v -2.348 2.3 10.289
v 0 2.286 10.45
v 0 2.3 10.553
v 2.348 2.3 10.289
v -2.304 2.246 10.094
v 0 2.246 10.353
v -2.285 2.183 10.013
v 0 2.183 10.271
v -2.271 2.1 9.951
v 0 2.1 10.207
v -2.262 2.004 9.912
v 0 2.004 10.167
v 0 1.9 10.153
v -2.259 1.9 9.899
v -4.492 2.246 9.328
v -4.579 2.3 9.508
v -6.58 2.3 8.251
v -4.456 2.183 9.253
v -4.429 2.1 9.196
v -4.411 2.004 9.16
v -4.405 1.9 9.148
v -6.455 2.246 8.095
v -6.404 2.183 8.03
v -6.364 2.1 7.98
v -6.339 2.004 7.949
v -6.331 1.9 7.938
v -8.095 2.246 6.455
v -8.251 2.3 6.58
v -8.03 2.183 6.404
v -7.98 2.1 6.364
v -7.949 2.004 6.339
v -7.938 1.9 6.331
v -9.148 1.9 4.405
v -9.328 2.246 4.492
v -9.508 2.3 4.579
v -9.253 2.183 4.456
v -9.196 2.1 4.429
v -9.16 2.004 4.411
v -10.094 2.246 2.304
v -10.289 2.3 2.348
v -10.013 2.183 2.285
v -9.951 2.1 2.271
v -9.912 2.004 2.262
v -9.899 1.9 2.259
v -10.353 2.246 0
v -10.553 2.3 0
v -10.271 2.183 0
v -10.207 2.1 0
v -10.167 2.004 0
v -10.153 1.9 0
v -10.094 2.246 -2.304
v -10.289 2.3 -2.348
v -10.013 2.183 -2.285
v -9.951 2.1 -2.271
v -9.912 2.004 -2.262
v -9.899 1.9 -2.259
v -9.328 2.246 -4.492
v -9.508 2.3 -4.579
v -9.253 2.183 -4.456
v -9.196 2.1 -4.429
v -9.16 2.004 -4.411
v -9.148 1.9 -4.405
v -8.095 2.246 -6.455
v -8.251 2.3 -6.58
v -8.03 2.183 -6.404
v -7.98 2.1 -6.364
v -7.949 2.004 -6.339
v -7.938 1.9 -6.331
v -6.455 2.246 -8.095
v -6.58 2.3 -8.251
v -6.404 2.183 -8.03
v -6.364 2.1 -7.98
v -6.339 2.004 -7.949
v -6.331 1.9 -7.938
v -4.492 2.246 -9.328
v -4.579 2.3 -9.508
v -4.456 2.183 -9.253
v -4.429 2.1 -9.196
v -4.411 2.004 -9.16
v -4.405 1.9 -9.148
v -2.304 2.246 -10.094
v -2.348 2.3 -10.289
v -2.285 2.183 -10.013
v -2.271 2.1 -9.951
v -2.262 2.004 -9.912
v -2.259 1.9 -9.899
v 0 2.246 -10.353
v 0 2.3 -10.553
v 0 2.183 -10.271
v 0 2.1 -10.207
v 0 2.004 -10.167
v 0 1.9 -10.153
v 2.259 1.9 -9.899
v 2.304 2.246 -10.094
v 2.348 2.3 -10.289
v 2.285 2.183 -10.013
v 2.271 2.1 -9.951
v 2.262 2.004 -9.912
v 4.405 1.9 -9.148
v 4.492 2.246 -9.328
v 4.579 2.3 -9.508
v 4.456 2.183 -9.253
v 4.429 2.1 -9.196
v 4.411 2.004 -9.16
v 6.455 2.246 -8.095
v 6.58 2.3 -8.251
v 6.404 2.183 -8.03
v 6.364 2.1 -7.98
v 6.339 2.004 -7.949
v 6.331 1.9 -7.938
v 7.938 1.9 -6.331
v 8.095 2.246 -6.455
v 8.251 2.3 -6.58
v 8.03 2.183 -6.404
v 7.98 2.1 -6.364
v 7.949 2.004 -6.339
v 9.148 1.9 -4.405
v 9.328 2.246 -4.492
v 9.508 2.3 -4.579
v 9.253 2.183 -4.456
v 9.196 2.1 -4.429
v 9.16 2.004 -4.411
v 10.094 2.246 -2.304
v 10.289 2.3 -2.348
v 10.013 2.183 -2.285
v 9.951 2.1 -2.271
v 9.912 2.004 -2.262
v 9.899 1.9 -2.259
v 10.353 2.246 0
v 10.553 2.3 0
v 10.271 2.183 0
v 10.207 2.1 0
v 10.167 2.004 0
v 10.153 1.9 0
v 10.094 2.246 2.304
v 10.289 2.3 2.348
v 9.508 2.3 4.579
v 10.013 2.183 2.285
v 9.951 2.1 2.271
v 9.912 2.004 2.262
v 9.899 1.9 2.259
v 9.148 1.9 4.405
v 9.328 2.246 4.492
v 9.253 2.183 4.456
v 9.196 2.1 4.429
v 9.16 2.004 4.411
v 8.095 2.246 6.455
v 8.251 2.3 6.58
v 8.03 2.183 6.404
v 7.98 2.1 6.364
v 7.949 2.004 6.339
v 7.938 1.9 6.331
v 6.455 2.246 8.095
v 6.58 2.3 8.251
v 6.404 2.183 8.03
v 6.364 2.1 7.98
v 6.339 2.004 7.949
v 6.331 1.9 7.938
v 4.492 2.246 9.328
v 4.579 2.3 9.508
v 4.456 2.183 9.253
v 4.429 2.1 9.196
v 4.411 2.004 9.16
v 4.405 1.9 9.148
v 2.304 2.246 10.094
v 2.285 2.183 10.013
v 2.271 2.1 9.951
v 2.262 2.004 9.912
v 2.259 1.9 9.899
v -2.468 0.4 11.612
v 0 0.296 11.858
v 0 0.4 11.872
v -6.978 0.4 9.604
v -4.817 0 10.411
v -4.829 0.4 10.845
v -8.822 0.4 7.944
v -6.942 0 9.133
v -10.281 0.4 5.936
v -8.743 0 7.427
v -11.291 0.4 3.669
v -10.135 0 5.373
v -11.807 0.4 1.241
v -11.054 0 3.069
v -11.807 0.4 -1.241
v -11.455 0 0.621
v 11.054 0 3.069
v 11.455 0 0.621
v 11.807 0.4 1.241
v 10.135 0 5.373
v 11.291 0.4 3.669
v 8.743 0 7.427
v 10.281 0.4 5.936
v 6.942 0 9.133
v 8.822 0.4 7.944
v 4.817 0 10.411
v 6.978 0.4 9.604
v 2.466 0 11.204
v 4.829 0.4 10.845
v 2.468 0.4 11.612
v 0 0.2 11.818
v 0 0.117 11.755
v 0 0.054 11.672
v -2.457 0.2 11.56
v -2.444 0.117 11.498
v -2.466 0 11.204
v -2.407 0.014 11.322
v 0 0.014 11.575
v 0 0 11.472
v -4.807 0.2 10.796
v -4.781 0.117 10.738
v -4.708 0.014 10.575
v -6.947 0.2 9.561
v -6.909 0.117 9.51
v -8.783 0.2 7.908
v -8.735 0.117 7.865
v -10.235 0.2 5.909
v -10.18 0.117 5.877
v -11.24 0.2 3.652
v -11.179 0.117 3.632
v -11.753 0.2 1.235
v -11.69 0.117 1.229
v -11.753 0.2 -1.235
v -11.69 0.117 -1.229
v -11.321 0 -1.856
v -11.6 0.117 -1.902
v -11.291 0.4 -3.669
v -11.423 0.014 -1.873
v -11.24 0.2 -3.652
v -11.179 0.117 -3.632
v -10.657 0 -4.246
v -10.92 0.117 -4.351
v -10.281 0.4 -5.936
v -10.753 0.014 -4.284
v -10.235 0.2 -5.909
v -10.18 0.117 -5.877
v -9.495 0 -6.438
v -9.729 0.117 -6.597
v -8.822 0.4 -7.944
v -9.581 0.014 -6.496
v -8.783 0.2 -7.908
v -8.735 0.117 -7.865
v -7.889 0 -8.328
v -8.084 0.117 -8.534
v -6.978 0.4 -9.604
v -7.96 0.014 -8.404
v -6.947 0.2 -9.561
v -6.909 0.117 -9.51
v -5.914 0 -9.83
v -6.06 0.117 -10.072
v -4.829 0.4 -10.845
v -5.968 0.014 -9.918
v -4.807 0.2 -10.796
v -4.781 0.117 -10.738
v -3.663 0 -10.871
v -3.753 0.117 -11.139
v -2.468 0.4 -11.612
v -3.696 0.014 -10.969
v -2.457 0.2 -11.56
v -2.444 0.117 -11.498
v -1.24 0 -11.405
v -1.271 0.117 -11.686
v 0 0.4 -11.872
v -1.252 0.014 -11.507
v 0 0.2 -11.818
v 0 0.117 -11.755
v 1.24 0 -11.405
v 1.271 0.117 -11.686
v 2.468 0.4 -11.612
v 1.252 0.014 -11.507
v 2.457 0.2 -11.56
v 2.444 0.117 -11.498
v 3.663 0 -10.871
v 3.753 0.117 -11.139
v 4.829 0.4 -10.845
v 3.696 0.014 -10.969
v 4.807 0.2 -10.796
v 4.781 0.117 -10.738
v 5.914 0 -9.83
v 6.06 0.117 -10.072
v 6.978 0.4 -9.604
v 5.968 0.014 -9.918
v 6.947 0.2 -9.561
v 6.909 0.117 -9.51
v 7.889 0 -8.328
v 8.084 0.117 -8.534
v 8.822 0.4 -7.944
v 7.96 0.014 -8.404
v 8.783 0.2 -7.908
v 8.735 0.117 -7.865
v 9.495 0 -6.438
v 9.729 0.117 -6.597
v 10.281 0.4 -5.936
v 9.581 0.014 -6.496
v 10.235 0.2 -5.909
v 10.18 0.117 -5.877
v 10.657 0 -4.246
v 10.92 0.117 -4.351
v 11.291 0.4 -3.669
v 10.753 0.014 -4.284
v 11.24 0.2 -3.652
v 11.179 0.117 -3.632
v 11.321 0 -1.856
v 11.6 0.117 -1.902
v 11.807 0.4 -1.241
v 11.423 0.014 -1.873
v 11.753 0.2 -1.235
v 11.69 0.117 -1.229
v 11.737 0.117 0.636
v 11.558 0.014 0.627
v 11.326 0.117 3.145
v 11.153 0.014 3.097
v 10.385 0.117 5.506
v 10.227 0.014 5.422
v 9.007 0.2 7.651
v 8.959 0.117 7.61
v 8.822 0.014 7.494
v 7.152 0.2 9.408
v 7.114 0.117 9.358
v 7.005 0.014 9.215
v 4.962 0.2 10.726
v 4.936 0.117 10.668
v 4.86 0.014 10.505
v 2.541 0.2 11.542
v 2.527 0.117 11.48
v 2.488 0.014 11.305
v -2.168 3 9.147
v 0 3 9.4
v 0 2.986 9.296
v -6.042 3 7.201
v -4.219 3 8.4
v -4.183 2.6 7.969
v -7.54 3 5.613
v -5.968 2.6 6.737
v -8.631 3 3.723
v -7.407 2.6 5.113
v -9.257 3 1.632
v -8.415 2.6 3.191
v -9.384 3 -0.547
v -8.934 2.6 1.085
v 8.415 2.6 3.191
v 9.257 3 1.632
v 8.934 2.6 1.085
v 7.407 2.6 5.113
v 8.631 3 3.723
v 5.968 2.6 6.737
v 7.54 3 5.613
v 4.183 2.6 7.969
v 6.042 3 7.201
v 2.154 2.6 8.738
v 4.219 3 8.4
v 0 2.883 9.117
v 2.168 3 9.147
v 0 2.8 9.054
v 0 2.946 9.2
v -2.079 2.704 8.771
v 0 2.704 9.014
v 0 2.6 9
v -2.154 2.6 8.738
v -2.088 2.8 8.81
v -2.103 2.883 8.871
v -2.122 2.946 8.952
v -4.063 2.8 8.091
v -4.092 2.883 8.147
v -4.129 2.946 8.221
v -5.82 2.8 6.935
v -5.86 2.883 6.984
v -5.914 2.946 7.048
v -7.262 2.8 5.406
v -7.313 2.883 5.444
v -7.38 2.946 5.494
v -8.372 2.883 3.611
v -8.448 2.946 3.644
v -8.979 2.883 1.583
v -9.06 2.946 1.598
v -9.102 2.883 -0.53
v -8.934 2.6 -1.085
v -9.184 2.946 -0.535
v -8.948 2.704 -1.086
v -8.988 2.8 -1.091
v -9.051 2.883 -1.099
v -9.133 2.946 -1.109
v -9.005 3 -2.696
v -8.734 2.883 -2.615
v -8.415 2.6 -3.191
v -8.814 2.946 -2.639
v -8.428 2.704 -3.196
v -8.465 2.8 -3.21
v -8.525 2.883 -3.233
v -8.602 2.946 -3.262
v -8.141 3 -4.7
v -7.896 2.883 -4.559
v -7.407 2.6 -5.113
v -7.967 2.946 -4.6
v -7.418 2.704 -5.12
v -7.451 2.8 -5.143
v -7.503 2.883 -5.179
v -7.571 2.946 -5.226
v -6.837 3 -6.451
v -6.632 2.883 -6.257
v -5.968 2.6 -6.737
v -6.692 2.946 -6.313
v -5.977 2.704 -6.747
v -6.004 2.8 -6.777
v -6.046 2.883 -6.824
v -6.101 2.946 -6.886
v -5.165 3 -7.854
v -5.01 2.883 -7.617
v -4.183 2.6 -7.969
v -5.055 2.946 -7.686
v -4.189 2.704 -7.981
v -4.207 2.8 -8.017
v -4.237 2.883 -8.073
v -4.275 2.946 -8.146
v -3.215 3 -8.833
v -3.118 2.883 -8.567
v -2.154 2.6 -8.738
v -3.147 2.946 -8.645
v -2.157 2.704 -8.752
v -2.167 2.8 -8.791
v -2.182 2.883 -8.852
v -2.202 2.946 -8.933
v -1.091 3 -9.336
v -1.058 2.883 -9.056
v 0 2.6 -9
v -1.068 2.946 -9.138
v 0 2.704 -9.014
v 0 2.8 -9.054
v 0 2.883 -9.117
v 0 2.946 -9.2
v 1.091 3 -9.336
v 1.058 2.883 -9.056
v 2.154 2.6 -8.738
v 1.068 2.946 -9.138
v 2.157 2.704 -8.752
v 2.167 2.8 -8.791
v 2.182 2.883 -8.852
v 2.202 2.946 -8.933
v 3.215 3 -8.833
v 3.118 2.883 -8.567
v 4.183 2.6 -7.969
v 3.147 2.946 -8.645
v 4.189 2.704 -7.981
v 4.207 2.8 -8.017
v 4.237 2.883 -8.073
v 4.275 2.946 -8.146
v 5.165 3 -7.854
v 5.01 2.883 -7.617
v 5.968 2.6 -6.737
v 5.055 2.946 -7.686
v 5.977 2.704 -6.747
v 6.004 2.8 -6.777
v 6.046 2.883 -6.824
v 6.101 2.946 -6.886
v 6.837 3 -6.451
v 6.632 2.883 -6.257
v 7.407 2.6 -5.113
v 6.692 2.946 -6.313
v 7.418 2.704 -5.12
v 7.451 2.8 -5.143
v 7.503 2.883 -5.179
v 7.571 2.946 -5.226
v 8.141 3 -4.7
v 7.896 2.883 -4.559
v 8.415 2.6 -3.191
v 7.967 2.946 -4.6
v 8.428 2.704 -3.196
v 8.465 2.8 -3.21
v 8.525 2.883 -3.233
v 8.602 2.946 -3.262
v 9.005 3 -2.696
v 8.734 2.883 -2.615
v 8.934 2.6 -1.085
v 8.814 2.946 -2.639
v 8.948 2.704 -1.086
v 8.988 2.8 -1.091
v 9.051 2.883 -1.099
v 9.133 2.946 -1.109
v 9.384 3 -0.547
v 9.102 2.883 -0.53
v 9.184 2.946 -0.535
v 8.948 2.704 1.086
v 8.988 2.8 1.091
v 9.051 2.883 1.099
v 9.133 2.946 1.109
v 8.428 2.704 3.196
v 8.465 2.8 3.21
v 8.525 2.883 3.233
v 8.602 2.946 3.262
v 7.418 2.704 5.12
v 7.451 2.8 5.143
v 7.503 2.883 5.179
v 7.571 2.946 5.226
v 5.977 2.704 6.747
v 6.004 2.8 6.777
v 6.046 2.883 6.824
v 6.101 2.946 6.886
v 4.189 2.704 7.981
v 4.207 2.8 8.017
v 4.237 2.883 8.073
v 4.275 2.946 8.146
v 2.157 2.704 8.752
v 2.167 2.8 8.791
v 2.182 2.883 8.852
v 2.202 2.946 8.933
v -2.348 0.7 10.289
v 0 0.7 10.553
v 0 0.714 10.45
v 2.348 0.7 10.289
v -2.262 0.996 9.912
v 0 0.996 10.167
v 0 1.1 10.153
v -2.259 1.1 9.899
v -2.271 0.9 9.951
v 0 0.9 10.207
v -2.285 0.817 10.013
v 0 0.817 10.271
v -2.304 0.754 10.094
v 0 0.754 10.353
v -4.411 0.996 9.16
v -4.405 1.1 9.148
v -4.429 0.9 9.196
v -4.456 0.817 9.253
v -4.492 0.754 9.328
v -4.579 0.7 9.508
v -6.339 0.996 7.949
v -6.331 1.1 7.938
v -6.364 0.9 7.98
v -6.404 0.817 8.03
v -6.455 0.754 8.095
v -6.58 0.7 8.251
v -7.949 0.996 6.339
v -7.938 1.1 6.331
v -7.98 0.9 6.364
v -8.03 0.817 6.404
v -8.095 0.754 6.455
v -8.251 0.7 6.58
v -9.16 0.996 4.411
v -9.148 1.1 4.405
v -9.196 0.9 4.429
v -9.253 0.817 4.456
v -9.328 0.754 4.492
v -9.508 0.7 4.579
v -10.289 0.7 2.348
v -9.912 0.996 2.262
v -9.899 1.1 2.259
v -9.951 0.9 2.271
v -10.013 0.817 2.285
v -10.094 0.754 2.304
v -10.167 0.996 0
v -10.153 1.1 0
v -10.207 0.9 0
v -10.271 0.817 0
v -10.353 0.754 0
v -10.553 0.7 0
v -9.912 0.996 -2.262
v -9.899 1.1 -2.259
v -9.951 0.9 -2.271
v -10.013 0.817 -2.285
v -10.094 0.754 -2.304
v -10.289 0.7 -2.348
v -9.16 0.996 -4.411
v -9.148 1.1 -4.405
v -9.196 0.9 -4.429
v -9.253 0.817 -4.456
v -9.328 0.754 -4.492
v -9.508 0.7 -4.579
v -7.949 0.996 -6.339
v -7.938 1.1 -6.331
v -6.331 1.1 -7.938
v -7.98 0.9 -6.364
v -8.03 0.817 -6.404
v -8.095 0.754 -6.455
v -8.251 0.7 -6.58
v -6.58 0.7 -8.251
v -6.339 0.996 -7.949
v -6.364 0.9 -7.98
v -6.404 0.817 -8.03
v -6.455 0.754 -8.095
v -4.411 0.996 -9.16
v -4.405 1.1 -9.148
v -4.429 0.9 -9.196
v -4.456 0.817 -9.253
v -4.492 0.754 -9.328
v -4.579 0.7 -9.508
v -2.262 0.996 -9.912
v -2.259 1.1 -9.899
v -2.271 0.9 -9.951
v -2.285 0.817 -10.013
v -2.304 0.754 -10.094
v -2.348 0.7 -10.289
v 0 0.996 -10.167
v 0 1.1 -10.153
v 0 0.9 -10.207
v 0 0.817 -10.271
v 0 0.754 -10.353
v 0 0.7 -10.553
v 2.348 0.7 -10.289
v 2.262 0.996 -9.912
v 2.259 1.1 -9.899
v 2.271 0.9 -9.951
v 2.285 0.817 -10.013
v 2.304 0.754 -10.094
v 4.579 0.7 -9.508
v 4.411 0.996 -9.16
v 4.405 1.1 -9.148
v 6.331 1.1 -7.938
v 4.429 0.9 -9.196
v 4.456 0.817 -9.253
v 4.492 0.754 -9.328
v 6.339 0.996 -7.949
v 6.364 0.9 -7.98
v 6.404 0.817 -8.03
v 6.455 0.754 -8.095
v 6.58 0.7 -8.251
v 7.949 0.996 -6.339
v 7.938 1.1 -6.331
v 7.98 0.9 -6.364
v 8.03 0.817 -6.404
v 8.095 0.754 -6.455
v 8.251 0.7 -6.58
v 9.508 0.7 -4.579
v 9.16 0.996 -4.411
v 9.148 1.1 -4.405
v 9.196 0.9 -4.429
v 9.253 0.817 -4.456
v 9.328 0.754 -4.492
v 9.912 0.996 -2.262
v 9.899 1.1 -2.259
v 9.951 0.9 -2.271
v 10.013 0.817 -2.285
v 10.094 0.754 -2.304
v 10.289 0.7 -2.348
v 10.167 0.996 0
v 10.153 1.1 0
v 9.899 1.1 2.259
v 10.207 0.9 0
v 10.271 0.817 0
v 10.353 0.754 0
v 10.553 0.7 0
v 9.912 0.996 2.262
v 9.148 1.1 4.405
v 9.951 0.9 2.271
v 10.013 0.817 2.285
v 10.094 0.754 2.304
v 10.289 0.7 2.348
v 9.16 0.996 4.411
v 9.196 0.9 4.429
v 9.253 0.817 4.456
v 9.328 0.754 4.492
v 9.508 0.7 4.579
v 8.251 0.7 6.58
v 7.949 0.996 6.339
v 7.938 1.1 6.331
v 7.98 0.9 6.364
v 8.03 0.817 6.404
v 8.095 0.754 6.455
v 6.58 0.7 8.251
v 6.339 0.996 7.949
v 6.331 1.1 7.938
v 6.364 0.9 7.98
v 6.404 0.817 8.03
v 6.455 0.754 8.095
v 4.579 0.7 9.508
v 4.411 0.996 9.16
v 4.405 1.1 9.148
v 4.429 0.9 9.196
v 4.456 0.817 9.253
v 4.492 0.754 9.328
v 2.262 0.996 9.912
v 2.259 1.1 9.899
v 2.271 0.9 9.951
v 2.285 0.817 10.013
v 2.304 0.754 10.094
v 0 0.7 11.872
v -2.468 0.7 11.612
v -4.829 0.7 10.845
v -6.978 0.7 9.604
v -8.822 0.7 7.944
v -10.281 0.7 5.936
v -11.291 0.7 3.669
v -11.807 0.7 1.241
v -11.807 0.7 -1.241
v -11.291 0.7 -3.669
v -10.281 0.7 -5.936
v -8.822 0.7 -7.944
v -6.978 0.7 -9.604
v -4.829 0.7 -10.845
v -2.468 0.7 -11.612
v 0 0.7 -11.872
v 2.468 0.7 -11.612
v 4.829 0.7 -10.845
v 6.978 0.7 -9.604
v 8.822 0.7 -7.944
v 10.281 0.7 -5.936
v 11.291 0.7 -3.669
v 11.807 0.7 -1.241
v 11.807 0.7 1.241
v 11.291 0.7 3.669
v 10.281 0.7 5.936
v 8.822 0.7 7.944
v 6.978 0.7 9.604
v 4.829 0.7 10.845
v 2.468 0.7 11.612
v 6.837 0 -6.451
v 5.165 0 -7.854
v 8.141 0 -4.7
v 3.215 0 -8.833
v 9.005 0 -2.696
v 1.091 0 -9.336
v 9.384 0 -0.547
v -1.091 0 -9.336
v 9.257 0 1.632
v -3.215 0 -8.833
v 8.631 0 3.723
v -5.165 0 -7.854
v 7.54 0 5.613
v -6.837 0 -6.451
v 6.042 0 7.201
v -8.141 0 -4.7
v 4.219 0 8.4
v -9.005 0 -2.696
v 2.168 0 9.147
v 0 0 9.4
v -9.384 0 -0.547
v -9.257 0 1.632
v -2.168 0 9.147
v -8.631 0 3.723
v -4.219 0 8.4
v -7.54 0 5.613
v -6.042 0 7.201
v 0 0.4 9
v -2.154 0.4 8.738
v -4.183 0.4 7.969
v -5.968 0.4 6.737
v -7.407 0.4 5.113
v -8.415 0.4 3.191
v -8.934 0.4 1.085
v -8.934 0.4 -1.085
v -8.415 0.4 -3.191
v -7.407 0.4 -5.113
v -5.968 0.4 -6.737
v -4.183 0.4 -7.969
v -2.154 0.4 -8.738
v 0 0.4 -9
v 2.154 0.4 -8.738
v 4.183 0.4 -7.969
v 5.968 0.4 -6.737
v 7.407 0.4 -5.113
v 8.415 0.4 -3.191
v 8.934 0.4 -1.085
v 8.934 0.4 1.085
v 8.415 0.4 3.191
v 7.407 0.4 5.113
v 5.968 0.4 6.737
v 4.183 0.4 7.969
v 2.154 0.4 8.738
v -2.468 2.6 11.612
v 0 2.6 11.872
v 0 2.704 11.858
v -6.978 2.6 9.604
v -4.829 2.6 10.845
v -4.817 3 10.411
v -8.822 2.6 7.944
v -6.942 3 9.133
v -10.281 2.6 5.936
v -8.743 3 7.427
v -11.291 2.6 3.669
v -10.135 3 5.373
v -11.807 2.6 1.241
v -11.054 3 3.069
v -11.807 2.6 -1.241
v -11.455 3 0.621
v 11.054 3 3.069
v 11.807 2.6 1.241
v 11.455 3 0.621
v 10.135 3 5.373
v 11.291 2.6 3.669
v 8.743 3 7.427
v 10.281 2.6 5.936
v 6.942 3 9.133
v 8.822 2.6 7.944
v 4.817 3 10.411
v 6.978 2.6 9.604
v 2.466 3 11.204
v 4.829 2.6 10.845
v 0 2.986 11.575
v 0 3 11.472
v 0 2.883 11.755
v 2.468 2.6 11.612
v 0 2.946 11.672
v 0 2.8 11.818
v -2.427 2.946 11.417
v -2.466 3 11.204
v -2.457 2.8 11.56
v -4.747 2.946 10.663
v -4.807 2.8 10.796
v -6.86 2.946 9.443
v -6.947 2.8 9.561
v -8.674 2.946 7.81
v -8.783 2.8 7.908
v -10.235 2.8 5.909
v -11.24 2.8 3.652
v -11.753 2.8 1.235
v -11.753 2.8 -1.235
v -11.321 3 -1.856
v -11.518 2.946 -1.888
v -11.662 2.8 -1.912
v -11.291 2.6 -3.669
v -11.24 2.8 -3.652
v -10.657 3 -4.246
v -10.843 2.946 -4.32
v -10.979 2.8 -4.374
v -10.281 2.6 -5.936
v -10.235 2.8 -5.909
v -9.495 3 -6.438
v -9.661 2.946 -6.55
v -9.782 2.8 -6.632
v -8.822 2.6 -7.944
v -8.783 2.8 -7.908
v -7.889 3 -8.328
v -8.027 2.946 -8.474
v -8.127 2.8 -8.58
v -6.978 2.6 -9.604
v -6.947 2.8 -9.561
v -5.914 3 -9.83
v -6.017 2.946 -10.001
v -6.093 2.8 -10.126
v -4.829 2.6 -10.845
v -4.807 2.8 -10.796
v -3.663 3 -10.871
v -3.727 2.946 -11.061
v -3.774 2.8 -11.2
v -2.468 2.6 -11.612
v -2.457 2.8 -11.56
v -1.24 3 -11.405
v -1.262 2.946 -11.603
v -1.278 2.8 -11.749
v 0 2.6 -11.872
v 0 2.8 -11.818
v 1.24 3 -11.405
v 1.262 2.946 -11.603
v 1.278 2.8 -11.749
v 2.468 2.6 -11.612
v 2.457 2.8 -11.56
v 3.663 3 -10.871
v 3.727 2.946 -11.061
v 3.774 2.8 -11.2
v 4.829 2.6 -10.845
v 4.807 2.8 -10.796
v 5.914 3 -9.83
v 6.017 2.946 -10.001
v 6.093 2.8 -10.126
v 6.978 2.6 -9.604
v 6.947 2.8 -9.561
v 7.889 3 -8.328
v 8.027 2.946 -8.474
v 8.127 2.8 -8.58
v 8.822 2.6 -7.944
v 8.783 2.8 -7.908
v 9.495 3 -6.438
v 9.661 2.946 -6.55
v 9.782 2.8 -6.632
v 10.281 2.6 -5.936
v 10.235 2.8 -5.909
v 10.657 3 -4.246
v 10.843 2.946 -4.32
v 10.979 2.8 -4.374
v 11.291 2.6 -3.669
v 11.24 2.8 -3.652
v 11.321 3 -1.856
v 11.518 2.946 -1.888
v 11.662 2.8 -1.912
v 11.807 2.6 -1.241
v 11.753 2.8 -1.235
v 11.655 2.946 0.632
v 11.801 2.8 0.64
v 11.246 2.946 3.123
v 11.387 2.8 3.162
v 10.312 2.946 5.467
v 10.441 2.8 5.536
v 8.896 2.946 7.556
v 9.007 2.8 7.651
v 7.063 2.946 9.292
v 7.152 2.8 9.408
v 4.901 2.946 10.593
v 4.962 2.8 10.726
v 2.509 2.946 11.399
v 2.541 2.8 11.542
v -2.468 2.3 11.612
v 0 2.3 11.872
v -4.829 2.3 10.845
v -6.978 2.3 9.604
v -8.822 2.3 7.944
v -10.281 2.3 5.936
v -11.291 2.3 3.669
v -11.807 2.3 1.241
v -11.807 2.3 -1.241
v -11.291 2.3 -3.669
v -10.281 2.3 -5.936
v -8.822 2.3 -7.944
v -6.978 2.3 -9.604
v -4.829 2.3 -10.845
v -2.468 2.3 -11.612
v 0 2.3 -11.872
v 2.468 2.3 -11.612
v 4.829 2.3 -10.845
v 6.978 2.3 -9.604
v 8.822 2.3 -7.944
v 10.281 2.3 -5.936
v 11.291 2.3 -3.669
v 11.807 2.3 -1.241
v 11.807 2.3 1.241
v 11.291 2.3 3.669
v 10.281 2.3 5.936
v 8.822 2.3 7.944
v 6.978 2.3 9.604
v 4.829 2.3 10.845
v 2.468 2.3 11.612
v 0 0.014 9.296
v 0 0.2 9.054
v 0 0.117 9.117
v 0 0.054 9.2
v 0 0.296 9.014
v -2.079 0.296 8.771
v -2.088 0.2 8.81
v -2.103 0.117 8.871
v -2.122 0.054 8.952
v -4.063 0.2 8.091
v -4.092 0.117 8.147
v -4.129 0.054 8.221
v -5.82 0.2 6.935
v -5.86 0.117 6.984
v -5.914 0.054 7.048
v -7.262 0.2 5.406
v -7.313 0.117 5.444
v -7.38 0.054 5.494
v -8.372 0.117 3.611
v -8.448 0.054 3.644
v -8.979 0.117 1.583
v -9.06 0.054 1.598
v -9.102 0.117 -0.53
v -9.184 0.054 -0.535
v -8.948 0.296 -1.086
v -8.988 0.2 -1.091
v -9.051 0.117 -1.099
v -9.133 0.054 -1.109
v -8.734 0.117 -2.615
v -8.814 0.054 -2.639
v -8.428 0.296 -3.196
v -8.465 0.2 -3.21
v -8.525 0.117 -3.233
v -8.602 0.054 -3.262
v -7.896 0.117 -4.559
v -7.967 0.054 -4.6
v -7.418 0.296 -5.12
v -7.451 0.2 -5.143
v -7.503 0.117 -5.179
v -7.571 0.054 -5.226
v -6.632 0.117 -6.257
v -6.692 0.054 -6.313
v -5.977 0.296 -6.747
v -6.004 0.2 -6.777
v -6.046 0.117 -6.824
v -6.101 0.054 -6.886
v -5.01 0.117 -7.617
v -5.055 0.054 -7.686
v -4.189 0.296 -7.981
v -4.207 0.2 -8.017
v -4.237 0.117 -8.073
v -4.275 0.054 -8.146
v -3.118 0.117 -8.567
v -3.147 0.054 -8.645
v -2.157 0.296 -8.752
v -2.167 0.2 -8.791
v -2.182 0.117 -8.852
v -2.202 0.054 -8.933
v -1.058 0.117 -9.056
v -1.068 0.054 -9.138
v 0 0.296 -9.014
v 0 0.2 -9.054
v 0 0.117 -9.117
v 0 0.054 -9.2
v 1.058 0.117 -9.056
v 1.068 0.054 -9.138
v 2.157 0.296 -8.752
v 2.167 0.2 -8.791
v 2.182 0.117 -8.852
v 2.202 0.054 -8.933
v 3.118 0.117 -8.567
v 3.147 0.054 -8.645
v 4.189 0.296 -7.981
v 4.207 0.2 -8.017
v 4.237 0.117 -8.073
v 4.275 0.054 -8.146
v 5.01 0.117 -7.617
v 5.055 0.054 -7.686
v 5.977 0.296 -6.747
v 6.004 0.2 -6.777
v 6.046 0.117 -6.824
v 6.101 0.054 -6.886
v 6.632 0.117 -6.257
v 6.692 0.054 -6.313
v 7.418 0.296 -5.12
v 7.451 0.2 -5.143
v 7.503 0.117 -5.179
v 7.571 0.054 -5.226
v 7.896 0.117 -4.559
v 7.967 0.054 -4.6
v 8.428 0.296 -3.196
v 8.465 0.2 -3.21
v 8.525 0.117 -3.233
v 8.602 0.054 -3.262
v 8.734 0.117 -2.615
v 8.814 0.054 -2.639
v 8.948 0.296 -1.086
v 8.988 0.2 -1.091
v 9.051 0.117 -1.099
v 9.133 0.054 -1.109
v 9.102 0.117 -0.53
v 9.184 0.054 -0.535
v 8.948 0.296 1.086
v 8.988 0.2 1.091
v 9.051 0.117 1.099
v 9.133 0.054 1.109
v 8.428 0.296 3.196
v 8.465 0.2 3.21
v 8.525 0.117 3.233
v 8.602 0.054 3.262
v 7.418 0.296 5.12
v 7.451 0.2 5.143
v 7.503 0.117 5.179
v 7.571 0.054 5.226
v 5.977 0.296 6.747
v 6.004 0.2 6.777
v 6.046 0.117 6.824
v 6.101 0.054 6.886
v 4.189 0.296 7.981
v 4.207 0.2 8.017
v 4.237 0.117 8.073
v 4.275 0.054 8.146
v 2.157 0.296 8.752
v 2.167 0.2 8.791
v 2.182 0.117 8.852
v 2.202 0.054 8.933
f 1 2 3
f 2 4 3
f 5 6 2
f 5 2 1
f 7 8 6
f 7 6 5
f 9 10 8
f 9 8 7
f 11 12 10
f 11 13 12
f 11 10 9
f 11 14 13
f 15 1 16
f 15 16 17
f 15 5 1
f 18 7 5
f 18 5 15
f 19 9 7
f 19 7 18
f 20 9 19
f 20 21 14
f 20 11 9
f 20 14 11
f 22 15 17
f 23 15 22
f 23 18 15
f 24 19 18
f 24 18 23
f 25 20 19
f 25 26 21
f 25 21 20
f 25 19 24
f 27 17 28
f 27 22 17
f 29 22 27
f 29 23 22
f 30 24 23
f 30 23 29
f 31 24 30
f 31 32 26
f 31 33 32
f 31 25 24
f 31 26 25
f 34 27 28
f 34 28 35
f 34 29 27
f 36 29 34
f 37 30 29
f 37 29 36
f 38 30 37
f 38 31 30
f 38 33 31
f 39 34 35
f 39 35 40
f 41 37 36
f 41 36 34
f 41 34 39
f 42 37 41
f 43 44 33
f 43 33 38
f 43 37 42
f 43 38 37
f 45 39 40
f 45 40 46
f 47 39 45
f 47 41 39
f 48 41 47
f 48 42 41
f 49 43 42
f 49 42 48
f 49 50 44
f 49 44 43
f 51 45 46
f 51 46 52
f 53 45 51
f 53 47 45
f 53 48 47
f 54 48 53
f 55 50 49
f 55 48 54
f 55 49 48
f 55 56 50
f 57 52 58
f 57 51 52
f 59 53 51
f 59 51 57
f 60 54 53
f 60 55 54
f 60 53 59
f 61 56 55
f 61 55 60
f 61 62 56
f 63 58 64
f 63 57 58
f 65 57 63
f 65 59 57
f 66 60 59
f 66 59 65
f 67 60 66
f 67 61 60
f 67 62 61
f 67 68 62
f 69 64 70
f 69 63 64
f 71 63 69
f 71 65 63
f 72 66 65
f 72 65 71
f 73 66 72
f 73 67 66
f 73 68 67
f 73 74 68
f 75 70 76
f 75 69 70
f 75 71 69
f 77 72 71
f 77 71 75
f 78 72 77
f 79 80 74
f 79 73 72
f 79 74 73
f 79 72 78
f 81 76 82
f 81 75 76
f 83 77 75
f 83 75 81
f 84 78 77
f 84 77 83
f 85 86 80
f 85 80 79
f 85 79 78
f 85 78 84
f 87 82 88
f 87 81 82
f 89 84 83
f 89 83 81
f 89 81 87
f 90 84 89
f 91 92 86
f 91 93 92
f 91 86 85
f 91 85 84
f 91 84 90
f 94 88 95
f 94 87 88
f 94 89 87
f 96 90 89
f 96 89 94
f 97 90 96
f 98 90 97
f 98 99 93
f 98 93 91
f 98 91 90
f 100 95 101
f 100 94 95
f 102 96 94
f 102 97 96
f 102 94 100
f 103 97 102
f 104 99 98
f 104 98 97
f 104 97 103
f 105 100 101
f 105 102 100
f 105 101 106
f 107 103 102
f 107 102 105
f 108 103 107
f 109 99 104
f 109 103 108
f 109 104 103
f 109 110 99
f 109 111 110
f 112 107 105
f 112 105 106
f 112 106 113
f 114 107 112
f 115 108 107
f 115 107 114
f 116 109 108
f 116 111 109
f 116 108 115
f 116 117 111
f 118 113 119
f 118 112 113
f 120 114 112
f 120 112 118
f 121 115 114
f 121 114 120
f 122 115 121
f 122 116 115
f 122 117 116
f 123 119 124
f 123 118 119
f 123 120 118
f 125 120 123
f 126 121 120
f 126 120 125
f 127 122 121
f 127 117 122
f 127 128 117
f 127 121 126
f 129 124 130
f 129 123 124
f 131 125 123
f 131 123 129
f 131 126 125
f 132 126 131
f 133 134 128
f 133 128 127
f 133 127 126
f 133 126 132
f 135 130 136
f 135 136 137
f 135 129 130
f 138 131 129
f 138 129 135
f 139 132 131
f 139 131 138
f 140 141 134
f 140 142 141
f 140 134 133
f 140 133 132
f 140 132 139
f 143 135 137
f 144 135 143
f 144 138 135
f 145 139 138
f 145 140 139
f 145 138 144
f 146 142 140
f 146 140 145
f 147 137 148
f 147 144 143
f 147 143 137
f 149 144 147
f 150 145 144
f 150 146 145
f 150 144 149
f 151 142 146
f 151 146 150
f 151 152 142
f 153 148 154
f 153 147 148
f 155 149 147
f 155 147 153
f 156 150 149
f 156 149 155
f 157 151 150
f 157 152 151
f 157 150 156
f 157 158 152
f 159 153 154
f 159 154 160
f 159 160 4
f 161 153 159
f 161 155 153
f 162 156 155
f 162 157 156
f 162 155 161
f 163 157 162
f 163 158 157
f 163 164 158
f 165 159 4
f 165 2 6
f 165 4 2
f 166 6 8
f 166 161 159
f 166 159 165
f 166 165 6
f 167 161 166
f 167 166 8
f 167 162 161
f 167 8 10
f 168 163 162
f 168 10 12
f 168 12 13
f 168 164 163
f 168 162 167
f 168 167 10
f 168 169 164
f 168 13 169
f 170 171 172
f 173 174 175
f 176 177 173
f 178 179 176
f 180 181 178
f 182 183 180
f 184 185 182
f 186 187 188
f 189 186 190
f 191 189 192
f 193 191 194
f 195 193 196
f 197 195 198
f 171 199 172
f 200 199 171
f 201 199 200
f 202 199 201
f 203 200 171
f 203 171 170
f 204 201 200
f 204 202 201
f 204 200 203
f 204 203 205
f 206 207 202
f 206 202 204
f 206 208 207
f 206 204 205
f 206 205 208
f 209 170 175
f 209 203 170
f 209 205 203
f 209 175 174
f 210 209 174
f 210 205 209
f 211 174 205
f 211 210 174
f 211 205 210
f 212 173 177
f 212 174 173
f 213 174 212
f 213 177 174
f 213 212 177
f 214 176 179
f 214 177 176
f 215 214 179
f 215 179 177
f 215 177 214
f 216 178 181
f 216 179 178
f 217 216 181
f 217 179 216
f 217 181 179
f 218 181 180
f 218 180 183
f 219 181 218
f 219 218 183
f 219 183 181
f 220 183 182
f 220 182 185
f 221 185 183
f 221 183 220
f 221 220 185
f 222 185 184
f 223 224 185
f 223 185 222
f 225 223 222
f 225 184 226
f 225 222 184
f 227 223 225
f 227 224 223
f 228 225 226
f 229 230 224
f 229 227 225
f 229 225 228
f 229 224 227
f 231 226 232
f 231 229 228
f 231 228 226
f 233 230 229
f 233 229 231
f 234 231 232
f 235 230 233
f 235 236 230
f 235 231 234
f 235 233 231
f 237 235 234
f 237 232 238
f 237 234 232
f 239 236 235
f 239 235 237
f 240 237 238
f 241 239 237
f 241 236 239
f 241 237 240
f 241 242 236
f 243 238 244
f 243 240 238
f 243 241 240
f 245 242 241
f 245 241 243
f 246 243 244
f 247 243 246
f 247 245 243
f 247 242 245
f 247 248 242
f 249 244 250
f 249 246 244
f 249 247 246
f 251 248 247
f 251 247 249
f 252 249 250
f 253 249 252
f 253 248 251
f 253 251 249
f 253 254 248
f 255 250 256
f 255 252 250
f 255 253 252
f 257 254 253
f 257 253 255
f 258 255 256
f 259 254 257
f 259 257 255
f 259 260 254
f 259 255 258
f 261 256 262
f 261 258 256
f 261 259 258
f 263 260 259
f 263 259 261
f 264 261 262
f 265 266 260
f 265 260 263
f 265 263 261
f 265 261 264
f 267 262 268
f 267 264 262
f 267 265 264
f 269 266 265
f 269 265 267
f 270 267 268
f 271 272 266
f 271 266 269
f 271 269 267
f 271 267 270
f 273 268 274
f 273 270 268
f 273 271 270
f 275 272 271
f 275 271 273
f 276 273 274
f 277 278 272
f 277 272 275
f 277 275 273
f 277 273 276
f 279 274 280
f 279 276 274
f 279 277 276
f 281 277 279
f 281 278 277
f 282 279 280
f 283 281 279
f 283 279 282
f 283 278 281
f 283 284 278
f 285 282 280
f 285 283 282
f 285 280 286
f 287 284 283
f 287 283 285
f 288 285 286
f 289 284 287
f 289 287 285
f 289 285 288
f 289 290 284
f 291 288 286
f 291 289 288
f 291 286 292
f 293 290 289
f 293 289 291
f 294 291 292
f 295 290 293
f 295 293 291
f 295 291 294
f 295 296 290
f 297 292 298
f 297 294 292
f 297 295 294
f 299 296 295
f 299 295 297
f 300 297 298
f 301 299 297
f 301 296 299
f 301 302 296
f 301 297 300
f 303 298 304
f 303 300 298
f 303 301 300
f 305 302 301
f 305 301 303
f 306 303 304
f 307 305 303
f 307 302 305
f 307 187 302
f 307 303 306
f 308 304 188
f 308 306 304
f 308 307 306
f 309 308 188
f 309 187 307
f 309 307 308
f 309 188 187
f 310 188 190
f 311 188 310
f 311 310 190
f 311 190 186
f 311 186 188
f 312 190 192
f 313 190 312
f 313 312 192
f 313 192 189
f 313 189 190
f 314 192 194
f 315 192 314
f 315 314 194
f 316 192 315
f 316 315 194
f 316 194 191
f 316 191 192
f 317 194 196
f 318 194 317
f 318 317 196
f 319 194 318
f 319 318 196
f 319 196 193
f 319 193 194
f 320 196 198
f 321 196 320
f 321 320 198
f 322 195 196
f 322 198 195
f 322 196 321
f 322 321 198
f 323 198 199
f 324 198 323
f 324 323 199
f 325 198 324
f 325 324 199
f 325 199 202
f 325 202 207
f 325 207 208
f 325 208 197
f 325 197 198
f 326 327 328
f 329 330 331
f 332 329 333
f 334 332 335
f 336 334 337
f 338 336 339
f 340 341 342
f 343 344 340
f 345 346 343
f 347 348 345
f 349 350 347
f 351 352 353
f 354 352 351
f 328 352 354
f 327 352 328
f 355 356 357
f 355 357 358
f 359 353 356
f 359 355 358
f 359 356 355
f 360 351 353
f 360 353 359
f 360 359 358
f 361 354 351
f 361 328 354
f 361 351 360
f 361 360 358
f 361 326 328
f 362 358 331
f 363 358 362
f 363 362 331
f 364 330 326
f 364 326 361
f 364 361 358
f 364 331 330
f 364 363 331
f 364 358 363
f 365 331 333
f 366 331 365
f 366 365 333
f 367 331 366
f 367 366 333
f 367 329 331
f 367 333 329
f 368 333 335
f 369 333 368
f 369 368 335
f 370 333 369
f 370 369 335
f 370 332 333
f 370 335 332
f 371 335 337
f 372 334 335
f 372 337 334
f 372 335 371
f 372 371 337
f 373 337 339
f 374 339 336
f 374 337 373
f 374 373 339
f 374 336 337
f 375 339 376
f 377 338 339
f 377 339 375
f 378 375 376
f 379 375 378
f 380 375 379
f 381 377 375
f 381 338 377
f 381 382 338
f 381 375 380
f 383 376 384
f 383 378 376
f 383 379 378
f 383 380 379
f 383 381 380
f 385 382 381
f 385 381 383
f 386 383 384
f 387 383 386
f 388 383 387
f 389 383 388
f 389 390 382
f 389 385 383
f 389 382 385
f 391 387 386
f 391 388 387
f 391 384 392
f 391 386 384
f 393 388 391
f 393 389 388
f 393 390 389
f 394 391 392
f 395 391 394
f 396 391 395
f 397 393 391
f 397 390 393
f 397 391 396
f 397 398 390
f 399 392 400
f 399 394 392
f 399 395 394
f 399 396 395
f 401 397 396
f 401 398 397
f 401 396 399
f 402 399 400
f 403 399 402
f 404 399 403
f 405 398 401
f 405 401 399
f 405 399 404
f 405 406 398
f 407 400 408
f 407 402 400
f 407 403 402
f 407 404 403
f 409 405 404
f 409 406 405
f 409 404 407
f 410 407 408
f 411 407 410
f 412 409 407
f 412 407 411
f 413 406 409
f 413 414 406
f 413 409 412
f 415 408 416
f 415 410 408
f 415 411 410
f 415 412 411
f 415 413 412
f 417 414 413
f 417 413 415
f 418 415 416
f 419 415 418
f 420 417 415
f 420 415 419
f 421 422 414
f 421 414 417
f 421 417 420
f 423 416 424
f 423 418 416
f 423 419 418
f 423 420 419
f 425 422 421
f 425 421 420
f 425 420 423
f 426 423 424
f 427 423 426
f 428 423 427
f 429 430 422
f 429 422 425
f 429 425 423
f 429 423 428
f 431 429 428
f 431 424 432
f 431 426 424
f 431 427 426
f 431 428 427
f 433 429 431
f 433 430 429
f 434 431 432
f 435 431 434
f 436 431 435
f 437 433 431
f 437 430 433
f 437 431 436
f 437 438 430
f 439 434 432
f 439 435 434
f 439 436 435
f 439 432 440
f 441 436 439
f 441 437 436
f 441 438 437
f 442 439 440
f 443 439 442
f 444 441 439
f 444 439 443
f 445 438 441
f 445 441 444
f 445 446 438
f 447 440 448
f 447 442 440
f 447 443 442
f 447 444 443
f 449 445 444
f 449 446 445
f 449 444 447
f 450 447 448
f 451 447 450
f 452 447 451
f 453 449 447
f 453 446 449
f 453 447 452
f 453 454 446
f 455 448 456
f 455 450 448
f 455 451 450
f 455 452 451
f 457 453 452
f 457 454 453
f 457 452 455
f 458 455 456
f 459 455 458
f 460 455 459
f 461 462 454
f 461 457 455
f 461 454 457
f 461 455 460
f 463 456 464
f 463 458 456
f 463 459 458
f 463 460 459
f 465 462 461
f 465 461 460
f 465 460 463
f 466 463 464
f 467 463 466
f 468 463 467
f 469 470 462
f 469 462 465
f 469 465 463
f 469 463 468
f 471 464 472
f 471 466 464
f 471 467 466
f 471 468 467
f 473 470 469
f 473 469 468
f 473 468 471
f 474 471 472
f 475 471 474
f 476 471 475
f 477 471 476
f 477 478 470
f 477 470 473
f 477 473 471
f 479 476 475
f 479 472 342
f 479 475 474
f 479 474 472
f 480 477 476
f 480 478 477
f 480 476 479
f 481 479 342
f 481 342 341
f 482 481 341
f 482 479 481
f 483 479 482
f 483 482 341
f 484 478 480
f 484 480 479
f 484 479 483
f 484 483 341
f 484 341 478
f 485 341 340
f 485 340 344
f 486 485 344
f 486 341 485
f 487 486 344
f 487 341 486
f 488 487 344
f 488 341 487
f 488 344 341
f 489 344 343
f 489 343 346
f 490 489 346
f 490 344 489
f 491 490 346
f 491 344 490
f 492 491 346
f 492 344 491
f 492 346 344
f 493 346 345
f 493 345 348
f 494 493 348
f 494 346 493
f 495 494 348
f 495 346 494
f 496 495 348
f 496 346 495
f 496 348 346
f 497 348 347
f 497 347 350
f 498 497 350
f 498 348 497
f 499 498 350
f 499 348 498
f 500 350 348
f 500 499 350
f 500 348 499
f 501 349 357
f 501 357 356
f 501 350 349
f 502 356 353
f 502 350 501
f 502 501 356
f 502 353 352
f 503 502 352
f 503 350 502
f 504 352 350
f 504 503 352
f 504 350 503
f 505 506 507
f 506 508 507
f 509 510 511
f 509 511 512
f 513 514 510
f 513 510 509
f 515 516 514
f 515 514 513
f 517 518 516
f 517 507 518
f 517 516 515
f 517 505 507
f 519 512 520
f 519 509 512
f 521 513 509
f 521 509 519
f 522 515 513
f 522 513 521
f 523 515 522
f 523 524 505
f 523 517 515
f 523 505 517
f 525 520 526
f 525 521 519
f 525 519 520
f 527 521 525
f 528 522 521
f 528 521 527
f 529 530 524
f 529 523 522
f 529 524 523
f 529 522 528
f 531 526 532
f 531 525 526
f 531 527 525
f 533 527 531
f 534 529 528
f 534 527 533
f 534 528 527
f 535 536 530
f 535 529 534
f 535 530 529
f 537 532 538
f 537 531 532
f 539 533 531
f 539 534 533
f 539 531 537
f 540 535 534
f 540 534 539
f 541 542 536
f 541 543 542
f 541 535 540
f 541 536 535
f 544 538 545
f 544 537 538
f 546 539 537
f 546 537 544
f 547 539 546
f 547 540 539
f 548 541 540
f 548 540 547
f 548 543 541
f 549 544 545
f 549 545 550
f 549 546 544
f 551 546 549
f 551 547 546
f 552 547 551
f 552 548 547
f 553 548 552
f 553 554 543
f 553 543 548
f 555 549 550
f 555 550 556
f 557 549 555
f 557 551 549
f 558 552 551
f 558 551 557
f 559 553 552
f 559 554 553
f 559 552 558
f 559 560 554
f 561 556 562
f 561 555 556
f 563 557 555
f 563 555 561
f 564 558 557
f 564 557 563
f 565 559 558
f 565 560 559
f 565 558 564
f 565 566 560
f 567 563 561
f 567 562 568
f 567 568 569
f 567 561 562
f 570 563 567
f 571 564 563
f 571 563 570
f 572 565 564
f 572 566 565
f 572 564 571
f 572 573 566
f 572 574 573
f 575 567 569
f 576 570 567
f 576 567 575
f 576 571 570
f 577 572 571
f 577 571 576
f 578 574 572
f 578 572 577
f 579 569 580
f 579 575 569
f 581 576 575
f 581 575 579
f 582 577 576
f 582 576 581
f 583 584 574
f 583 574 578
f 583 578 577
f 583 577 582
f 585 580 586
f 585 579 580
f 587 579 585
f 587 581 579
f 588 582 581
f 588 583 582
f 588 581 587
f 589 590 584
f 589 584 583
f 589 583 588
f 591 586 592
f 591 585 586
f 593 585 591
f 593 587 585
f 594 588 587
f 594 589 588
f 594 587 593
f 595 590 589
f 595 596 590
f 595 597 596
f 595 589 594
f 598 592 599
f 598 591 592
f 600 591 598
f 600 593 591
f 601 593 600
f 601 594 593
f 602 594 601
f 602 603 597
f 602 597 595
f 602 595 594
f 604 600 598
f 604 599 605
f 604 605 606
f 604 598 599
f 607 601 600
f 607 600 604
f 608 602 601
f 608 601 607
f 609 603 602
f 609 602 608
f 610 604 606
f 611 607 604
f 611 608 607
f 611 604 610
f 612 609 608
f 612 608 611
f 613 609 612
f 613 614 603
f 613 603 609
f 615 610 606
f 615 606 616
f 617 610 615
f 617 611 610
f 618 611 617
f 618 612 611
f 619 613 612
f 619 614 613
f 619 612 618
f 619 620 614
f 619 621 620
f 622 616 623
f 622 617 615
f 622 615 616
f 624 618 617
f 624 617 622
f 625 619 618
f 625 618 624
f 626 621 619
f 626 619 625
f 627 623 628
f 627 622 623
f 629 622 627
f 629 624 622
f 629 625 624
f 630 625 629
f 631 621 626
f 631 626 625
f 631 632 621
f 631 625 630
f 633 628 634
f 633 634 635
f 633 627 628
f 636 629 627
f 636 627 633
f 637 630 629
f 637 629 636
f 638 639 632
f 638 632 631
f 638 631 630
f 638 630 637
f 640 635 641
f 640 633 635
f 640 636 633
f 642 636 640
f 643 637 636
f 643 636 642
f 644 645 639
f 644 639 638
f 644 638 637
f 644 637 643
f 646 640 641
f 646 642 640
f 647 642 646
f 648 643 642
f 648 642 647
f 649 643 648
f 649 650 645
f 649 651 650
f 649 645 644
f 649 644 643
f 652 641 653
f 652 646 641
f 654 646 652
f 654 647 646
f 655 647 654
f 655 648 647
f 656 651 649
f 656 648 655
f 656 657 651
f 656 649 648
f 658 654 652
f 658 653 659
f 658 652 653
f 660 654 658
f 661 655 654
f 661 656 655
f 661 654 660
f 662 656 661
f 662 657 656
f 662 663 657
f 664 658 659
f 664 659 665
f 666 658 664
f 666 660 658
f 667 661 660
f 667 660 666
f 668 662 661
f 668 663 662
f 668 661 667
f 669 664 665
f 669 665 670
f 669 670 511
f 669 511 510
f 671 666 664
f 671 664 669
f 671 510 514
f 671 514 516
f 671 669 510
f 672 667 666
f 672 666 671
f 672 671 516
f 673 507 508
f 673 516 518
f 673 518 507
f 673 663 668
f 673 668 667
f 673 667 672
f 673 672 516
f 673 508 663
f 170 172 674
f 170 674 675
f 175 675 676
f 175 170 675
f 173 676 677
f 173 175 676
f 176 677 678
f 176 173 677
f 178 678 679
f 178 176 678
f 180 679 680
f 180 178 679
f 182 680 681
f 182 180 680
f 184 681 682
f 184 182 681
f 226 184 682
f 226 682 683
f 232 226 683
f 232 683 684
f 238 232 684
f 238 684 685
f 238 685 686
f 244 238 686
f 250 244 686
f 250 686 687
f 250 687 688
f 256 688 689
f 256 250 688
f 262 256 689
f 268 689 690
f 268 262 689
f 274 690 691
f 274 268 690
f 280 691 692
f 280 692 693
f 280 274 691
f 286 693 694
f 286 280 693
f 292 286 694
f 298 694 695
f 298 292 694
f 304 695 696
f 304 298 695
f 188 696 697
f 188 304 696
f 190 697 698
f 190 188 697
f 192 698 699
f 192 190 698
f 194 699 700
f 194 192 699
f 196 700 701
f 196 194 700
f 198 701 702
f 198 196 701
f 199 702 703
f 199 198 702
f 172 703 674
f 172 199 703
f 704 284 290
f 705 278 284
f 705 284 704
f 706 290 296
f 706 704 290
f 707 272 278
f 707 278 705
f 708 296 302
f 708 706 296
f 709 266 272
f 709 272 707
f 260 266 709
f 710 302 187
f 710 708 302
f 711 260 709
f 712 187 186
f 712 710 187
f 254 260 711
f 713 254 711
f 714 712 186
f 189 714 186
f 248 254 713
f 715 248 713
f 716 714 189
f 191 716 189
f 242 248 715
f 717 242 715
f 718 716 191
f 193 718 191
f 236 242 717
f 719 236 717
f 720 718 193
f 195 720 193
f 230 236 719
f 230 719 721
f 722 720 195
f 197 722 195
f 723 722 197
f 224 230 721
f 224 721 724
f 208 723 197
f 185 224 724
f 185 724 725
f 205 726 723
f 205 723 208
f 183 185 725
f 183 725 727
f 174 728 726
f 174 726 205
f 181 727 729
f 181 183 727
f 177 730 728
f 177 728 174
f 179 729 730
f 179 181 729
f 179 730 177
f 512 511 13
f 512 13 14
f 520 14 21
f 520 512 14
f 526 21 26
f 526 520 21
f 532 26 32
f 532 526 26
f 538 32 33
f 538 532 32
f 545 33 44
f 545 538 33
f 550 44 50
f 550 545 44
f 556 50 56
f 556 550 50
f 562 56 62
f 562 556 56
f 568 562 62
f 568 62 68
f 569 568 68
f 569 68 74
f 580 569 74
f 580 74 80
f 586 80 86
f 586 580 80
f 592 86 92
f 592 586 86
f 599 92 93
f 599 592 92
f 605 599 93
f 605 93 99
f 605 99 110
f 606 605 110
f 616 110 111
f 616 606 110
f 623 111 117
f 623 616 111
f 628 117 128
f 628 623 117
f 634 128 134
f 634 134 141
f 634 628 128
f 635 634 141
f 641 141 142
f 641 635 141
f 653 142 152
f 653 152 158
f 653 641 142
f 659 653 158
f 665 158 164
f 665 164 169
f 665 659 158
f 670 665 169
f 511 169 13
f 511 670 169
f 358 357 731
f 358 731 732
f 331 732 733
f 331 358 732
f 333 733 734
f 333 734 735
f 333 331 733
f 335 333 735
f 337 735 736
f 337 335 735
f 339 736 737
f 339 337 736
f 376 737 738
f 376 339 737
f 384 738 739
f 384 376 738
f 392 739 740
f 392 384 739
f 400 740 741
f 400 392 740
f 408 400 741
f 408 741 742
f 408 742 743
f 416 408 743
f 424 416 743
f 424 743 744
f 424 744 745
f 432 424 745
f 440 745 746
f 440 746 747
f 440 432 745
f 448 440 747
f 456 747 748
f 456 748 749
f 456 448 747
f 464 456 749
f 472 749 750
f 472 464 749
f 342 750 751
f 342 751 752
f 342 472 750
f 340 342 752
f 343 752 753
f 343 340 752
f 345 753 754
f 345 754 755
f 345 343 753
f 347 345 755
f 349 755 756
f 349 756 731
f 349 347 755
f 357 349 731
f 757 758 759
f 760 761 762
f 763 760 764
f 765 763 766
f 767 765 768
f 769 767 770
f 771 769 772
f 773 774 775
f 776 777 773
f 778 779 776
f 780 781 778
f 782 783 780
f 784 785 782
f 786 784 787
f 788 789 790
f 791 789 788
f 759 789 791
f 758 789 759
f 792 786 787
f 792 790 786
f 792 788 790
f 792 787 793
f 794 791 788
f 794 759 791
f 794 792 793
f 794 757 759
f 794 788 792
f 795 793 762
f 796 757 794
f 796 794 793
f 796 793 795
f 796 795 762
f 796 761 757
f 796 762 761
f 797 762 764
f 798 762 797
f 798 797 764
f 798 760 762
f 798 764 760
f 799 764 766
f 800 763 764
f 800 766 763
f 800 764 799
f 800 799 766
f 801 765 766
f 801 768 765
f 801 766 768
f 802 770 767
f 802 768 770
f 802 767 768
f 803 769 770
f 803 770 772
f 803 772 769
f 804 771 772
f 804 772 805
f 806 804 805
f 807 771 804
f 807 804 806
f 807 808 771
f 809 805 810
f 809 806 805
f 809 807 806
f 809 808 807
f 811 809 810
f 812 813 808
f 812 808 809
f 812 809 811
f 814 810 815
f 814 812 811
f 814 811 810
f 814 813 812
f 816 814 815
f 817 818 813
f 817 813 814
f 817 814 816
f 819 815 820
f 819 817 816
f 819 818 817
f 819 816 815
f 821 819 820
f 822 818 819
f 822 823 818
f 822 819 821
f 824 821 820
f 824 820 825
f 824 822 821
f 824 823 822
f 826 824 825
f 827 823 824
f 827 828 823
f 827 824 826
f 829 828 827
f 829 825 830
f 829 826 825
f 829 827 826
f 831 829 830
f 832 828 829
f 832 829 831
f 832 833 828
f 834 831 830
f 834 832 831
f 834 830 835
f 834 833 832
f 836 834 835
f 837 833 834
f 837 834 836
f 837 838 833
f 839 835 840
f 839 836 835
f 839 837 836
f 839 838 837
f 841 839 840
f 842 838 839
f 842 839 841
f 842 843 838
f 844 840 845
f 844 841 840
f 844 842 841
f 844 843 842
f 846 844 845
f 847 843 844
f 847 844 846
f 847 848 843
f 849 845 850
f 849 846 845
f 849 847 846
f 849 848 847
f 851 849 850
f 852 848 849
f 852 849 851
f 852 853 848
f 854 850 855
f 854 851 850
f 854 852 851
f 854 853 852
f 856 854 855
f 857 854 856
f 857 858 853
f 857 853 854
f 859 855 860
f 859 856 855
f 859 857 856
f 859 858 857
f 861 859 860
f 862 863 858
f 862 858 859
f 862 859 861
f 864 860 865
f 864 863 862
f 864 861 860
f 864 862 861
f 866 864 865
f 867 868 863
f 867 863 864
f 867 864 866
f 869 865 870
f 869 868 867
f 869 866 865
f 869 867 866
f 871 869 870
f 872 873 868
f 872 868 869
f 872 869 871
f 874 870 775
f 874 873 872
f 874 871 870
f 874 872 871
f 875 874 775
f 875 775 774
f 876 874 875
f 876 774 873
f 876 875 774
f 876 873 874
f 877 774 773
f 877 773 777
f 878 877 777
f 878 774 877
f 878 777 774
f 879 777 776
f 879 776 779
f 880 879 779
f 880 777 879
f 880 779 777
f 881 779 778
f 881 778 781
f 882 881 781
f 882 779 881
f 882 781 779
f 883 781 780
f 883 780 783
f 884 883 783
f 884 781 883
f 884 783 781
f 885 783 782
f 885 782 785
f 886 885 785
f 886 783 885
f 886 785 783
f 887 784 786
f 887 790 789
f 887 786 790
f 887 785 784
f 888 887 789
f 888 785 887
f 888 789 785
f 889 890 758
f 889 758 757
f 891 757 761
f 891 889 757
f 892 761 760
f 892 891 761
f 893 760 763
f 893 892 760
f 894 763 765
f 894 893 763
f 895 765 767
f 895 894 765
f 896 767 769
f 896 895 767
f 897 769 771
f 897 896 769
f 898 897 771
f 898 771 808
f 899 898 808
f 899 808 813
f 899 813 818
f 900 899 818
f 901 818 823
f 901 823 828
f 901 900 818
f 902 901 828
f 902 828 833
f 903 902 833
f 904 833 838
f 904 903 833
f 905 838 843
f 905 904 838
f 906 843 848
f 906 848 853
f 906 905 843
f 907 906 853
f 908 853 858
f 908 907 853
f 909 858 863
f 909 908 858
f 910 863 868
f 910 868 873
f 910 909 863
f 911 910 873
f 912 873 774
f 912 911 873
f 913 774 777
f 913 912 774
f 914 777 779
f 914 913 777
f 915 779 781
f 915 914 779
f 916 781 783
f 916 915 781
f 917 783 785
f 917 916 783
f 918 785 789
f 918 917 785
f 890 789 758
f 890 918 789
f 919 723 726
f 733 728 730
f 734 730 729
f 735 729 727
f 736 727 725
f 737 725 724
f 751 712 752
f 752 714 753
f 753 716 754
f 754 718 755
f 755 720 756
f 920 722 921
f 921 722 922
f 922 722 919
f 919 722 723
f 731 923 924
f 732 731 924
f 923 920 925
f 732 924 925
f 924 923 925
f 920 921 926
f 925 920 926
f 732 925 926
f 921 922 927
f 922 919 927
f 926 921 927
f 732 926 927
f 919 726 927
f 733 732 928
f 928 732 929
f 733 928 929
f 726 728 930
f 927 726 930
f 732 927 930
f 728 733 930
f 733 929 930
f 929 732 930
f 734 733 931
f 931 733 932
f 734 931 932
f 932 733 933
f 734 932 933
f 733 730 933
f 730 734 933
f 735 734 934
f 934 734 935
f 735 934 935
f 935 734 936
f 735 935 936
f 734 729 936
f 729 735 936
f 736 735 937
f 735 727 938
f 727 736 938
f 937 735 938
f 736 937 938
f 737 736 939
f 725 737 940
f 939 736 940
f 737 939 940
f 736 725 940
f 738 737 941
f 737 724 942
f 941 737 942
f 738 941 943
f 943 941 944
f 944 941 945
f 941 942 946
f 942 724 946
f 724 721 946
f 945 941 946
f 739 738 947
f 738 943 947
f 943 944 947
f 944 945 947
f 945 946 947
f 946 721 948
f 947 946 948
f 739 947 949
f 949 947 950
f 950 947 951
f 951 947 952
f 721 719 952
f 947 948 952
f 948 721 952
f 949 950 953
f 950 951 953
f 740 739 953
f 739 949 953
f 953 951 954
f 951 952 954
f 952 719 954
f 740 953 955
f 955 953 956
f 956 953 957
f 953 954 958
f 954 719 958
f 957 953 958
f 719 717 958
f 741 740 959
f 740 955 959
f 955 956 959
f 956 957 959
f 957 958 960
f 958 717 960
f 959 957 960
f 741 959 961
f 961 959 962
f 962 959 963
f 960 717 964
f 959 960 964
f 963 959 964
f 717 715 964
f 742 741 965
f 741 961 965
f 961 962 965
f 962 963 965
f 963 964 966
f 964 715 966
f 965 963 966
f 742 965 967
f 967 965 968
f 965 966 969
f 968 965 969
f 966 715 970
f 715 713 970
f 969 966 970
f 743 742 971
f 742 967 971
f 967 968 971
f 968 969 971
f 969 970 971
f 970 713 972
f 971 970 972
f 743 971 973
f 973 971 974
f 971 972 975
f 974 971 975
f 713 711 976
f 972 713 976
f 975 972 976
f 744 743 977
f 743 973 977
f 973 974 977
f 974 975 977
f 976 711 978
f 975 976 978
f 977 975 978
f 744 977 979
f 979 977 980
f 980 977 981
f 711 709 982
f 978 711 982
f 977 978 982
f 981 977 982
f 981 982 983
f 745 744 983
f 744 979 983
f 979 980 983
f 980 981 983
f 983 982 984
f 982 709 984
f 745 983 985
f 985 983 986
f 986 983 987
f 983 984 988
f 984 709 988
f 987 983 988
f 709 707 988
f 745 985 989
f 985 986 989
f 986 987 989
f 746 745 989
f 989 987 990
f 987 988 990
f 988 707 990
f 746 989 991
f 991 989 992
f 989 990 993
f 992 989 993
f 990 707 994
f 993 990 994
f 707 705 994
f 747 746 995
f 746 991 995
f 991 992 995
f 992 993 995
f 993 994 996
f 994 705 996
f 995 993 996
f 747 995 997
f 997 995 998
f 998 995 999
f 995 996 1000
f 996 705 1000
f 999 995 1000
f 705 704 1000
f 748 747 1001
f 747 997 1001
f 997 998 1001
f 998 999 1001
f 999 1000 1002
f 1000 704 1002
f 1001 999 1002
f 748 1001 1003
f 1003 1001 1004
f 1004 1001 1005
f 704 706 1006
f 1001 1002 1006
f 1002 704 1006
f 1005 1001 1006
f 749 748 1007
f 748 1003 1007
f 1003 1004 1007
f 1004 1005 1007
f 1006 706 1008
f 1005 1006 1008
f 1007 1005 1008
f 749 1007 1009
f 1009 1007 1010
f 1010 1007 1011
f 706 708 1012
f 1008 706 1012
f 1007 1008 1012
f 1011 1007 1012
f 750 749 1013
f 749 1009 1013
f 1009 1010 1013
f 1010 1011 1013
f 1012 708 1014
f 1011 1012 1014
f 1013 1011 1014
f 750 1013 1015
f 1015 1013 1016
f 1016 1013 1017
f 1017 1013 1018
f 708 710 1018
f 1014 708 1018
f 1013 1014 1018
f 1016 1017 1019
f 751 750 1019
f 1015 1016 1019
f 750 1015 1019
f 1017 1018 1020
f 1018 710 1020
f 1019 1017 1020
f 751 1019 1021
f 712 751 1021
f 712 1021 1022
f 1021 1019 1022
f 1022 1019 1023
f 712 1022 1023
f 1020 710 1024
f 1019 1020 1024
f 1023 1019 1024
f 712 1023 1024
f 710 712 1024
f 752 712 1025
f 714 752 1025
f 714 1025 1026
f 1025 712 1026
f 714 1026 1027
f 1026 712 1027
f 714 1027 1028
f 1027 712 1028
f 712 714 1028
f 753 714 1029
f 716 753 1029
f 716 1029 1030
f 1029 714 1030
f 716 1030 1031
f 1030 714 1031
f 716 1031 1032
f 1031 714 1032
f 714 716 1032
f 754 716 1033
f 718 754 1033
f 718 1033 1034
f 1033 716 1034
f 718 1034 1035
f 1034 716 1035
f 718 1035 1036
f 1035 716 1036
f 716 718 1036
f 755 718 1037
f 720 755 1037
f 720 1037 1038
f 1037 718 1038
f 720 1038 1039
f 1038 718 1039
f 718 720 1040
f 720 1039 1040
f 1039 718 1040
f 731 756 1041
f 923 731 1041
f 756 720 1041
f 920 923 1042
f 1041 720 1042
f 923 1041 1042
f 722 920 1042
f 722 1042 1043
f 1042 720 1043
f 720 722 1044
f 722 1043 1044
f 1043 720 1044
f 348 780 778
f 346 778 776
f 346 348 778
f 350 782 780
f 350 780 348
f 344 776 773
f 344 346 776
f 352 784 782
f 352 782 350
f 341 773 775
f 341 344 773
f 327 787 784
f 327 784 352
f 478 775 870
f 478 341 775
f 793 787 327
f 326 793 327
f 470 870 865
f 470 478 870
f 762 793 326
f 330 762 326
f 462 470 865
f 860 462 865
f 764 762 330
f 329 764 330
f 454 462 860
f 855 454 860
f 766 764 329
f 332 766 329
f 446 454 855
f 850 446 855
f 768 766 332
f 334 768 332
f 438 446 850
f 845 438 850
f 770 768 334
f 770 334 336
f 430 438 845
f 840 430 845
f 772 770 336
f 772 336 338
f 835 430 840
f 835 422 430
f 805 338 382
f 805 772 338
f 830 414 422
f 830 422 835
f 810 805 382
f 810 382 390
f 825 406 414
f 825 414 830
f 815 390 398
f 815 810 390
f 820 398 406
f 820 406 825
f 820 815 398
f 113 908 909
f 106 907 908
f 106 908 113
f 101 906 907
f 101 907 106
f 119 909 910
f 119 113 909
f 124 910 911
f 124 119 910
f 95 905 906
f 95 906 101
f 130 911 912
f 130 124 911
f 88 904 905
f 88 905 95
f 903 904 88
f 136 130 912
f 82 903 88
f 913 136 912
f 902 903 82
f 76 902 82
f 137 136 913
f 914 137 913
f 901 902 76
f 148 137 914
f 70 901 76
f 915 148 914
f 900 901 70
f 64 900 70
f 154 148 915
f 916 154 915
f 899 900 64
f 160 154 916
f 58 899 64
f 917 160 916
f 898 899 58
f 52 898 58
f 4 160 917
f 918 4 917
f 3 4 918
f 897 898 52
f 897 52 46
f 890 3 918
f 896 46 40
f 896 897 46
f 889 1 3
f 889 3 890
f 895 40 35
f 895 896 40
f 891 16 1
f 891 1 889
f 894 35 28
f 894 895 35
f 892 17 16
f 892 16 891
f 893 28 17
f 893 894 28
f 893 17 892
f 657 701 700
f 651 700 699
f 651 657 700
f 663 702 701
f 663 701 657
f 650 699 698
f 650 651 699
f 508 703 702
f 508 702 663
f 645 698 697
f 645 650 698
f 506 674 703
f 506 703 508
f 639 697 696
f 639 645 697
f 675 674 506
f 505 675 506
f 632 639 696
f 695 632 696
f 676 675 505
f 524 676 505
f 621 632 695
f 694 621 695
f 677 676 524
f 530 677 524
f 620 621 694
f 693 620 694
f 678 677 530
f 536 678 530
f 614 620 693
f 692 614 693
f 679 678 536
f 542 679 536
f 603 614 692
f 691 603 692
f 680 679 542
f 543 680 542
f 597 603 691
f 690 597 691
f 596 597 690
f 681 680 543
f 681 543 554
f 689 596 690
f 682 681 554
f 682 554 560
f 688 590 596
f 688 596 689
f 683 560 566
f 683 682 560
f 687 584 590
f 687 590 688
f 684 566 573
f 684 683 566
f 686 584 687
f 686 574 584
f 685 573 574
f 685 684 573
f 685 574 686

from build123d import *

# Parameters (mm, degrees)
FILLET1_R = 0.4


with BuildPart() as part:
    # Sketch1 → Revolve1 (revolve)
    with BuildSketch(Plane.XY, mode=Mode.PRIVATE) as revolve1_sk:
        Polygon((-9, 0), (-9, 3), (-11.87175241, 3), (-11.87175241, 2.3), (-10.153413472, 2.3), (-10.153413472, 0.7), (-11.87175241, 0.7), (-11.87175241, 0), align=None)
    revolve(revolve1_sk.sketch.rotate(Axis((0, 7.246866229, 0), (0, -1, 0)), 270), axis=Axis((0, 7.246866229, 0), (0, -1, 0)))

    # Fillet1
    fillet1_edges = [part.edges().sort_by_distance(p)[0] for p in [
        (0, 0, -11.87175241),
        (0, 0.7, -10.153413472),
        (0, 2.3, -10.153413472),
        (0, 3, -11.87175241),
        (0, 3, -9),
        (0, 0, -9),
    ]]
    fillet(fillet1_edges, radius=FILLET1_R)


solid = part.part
